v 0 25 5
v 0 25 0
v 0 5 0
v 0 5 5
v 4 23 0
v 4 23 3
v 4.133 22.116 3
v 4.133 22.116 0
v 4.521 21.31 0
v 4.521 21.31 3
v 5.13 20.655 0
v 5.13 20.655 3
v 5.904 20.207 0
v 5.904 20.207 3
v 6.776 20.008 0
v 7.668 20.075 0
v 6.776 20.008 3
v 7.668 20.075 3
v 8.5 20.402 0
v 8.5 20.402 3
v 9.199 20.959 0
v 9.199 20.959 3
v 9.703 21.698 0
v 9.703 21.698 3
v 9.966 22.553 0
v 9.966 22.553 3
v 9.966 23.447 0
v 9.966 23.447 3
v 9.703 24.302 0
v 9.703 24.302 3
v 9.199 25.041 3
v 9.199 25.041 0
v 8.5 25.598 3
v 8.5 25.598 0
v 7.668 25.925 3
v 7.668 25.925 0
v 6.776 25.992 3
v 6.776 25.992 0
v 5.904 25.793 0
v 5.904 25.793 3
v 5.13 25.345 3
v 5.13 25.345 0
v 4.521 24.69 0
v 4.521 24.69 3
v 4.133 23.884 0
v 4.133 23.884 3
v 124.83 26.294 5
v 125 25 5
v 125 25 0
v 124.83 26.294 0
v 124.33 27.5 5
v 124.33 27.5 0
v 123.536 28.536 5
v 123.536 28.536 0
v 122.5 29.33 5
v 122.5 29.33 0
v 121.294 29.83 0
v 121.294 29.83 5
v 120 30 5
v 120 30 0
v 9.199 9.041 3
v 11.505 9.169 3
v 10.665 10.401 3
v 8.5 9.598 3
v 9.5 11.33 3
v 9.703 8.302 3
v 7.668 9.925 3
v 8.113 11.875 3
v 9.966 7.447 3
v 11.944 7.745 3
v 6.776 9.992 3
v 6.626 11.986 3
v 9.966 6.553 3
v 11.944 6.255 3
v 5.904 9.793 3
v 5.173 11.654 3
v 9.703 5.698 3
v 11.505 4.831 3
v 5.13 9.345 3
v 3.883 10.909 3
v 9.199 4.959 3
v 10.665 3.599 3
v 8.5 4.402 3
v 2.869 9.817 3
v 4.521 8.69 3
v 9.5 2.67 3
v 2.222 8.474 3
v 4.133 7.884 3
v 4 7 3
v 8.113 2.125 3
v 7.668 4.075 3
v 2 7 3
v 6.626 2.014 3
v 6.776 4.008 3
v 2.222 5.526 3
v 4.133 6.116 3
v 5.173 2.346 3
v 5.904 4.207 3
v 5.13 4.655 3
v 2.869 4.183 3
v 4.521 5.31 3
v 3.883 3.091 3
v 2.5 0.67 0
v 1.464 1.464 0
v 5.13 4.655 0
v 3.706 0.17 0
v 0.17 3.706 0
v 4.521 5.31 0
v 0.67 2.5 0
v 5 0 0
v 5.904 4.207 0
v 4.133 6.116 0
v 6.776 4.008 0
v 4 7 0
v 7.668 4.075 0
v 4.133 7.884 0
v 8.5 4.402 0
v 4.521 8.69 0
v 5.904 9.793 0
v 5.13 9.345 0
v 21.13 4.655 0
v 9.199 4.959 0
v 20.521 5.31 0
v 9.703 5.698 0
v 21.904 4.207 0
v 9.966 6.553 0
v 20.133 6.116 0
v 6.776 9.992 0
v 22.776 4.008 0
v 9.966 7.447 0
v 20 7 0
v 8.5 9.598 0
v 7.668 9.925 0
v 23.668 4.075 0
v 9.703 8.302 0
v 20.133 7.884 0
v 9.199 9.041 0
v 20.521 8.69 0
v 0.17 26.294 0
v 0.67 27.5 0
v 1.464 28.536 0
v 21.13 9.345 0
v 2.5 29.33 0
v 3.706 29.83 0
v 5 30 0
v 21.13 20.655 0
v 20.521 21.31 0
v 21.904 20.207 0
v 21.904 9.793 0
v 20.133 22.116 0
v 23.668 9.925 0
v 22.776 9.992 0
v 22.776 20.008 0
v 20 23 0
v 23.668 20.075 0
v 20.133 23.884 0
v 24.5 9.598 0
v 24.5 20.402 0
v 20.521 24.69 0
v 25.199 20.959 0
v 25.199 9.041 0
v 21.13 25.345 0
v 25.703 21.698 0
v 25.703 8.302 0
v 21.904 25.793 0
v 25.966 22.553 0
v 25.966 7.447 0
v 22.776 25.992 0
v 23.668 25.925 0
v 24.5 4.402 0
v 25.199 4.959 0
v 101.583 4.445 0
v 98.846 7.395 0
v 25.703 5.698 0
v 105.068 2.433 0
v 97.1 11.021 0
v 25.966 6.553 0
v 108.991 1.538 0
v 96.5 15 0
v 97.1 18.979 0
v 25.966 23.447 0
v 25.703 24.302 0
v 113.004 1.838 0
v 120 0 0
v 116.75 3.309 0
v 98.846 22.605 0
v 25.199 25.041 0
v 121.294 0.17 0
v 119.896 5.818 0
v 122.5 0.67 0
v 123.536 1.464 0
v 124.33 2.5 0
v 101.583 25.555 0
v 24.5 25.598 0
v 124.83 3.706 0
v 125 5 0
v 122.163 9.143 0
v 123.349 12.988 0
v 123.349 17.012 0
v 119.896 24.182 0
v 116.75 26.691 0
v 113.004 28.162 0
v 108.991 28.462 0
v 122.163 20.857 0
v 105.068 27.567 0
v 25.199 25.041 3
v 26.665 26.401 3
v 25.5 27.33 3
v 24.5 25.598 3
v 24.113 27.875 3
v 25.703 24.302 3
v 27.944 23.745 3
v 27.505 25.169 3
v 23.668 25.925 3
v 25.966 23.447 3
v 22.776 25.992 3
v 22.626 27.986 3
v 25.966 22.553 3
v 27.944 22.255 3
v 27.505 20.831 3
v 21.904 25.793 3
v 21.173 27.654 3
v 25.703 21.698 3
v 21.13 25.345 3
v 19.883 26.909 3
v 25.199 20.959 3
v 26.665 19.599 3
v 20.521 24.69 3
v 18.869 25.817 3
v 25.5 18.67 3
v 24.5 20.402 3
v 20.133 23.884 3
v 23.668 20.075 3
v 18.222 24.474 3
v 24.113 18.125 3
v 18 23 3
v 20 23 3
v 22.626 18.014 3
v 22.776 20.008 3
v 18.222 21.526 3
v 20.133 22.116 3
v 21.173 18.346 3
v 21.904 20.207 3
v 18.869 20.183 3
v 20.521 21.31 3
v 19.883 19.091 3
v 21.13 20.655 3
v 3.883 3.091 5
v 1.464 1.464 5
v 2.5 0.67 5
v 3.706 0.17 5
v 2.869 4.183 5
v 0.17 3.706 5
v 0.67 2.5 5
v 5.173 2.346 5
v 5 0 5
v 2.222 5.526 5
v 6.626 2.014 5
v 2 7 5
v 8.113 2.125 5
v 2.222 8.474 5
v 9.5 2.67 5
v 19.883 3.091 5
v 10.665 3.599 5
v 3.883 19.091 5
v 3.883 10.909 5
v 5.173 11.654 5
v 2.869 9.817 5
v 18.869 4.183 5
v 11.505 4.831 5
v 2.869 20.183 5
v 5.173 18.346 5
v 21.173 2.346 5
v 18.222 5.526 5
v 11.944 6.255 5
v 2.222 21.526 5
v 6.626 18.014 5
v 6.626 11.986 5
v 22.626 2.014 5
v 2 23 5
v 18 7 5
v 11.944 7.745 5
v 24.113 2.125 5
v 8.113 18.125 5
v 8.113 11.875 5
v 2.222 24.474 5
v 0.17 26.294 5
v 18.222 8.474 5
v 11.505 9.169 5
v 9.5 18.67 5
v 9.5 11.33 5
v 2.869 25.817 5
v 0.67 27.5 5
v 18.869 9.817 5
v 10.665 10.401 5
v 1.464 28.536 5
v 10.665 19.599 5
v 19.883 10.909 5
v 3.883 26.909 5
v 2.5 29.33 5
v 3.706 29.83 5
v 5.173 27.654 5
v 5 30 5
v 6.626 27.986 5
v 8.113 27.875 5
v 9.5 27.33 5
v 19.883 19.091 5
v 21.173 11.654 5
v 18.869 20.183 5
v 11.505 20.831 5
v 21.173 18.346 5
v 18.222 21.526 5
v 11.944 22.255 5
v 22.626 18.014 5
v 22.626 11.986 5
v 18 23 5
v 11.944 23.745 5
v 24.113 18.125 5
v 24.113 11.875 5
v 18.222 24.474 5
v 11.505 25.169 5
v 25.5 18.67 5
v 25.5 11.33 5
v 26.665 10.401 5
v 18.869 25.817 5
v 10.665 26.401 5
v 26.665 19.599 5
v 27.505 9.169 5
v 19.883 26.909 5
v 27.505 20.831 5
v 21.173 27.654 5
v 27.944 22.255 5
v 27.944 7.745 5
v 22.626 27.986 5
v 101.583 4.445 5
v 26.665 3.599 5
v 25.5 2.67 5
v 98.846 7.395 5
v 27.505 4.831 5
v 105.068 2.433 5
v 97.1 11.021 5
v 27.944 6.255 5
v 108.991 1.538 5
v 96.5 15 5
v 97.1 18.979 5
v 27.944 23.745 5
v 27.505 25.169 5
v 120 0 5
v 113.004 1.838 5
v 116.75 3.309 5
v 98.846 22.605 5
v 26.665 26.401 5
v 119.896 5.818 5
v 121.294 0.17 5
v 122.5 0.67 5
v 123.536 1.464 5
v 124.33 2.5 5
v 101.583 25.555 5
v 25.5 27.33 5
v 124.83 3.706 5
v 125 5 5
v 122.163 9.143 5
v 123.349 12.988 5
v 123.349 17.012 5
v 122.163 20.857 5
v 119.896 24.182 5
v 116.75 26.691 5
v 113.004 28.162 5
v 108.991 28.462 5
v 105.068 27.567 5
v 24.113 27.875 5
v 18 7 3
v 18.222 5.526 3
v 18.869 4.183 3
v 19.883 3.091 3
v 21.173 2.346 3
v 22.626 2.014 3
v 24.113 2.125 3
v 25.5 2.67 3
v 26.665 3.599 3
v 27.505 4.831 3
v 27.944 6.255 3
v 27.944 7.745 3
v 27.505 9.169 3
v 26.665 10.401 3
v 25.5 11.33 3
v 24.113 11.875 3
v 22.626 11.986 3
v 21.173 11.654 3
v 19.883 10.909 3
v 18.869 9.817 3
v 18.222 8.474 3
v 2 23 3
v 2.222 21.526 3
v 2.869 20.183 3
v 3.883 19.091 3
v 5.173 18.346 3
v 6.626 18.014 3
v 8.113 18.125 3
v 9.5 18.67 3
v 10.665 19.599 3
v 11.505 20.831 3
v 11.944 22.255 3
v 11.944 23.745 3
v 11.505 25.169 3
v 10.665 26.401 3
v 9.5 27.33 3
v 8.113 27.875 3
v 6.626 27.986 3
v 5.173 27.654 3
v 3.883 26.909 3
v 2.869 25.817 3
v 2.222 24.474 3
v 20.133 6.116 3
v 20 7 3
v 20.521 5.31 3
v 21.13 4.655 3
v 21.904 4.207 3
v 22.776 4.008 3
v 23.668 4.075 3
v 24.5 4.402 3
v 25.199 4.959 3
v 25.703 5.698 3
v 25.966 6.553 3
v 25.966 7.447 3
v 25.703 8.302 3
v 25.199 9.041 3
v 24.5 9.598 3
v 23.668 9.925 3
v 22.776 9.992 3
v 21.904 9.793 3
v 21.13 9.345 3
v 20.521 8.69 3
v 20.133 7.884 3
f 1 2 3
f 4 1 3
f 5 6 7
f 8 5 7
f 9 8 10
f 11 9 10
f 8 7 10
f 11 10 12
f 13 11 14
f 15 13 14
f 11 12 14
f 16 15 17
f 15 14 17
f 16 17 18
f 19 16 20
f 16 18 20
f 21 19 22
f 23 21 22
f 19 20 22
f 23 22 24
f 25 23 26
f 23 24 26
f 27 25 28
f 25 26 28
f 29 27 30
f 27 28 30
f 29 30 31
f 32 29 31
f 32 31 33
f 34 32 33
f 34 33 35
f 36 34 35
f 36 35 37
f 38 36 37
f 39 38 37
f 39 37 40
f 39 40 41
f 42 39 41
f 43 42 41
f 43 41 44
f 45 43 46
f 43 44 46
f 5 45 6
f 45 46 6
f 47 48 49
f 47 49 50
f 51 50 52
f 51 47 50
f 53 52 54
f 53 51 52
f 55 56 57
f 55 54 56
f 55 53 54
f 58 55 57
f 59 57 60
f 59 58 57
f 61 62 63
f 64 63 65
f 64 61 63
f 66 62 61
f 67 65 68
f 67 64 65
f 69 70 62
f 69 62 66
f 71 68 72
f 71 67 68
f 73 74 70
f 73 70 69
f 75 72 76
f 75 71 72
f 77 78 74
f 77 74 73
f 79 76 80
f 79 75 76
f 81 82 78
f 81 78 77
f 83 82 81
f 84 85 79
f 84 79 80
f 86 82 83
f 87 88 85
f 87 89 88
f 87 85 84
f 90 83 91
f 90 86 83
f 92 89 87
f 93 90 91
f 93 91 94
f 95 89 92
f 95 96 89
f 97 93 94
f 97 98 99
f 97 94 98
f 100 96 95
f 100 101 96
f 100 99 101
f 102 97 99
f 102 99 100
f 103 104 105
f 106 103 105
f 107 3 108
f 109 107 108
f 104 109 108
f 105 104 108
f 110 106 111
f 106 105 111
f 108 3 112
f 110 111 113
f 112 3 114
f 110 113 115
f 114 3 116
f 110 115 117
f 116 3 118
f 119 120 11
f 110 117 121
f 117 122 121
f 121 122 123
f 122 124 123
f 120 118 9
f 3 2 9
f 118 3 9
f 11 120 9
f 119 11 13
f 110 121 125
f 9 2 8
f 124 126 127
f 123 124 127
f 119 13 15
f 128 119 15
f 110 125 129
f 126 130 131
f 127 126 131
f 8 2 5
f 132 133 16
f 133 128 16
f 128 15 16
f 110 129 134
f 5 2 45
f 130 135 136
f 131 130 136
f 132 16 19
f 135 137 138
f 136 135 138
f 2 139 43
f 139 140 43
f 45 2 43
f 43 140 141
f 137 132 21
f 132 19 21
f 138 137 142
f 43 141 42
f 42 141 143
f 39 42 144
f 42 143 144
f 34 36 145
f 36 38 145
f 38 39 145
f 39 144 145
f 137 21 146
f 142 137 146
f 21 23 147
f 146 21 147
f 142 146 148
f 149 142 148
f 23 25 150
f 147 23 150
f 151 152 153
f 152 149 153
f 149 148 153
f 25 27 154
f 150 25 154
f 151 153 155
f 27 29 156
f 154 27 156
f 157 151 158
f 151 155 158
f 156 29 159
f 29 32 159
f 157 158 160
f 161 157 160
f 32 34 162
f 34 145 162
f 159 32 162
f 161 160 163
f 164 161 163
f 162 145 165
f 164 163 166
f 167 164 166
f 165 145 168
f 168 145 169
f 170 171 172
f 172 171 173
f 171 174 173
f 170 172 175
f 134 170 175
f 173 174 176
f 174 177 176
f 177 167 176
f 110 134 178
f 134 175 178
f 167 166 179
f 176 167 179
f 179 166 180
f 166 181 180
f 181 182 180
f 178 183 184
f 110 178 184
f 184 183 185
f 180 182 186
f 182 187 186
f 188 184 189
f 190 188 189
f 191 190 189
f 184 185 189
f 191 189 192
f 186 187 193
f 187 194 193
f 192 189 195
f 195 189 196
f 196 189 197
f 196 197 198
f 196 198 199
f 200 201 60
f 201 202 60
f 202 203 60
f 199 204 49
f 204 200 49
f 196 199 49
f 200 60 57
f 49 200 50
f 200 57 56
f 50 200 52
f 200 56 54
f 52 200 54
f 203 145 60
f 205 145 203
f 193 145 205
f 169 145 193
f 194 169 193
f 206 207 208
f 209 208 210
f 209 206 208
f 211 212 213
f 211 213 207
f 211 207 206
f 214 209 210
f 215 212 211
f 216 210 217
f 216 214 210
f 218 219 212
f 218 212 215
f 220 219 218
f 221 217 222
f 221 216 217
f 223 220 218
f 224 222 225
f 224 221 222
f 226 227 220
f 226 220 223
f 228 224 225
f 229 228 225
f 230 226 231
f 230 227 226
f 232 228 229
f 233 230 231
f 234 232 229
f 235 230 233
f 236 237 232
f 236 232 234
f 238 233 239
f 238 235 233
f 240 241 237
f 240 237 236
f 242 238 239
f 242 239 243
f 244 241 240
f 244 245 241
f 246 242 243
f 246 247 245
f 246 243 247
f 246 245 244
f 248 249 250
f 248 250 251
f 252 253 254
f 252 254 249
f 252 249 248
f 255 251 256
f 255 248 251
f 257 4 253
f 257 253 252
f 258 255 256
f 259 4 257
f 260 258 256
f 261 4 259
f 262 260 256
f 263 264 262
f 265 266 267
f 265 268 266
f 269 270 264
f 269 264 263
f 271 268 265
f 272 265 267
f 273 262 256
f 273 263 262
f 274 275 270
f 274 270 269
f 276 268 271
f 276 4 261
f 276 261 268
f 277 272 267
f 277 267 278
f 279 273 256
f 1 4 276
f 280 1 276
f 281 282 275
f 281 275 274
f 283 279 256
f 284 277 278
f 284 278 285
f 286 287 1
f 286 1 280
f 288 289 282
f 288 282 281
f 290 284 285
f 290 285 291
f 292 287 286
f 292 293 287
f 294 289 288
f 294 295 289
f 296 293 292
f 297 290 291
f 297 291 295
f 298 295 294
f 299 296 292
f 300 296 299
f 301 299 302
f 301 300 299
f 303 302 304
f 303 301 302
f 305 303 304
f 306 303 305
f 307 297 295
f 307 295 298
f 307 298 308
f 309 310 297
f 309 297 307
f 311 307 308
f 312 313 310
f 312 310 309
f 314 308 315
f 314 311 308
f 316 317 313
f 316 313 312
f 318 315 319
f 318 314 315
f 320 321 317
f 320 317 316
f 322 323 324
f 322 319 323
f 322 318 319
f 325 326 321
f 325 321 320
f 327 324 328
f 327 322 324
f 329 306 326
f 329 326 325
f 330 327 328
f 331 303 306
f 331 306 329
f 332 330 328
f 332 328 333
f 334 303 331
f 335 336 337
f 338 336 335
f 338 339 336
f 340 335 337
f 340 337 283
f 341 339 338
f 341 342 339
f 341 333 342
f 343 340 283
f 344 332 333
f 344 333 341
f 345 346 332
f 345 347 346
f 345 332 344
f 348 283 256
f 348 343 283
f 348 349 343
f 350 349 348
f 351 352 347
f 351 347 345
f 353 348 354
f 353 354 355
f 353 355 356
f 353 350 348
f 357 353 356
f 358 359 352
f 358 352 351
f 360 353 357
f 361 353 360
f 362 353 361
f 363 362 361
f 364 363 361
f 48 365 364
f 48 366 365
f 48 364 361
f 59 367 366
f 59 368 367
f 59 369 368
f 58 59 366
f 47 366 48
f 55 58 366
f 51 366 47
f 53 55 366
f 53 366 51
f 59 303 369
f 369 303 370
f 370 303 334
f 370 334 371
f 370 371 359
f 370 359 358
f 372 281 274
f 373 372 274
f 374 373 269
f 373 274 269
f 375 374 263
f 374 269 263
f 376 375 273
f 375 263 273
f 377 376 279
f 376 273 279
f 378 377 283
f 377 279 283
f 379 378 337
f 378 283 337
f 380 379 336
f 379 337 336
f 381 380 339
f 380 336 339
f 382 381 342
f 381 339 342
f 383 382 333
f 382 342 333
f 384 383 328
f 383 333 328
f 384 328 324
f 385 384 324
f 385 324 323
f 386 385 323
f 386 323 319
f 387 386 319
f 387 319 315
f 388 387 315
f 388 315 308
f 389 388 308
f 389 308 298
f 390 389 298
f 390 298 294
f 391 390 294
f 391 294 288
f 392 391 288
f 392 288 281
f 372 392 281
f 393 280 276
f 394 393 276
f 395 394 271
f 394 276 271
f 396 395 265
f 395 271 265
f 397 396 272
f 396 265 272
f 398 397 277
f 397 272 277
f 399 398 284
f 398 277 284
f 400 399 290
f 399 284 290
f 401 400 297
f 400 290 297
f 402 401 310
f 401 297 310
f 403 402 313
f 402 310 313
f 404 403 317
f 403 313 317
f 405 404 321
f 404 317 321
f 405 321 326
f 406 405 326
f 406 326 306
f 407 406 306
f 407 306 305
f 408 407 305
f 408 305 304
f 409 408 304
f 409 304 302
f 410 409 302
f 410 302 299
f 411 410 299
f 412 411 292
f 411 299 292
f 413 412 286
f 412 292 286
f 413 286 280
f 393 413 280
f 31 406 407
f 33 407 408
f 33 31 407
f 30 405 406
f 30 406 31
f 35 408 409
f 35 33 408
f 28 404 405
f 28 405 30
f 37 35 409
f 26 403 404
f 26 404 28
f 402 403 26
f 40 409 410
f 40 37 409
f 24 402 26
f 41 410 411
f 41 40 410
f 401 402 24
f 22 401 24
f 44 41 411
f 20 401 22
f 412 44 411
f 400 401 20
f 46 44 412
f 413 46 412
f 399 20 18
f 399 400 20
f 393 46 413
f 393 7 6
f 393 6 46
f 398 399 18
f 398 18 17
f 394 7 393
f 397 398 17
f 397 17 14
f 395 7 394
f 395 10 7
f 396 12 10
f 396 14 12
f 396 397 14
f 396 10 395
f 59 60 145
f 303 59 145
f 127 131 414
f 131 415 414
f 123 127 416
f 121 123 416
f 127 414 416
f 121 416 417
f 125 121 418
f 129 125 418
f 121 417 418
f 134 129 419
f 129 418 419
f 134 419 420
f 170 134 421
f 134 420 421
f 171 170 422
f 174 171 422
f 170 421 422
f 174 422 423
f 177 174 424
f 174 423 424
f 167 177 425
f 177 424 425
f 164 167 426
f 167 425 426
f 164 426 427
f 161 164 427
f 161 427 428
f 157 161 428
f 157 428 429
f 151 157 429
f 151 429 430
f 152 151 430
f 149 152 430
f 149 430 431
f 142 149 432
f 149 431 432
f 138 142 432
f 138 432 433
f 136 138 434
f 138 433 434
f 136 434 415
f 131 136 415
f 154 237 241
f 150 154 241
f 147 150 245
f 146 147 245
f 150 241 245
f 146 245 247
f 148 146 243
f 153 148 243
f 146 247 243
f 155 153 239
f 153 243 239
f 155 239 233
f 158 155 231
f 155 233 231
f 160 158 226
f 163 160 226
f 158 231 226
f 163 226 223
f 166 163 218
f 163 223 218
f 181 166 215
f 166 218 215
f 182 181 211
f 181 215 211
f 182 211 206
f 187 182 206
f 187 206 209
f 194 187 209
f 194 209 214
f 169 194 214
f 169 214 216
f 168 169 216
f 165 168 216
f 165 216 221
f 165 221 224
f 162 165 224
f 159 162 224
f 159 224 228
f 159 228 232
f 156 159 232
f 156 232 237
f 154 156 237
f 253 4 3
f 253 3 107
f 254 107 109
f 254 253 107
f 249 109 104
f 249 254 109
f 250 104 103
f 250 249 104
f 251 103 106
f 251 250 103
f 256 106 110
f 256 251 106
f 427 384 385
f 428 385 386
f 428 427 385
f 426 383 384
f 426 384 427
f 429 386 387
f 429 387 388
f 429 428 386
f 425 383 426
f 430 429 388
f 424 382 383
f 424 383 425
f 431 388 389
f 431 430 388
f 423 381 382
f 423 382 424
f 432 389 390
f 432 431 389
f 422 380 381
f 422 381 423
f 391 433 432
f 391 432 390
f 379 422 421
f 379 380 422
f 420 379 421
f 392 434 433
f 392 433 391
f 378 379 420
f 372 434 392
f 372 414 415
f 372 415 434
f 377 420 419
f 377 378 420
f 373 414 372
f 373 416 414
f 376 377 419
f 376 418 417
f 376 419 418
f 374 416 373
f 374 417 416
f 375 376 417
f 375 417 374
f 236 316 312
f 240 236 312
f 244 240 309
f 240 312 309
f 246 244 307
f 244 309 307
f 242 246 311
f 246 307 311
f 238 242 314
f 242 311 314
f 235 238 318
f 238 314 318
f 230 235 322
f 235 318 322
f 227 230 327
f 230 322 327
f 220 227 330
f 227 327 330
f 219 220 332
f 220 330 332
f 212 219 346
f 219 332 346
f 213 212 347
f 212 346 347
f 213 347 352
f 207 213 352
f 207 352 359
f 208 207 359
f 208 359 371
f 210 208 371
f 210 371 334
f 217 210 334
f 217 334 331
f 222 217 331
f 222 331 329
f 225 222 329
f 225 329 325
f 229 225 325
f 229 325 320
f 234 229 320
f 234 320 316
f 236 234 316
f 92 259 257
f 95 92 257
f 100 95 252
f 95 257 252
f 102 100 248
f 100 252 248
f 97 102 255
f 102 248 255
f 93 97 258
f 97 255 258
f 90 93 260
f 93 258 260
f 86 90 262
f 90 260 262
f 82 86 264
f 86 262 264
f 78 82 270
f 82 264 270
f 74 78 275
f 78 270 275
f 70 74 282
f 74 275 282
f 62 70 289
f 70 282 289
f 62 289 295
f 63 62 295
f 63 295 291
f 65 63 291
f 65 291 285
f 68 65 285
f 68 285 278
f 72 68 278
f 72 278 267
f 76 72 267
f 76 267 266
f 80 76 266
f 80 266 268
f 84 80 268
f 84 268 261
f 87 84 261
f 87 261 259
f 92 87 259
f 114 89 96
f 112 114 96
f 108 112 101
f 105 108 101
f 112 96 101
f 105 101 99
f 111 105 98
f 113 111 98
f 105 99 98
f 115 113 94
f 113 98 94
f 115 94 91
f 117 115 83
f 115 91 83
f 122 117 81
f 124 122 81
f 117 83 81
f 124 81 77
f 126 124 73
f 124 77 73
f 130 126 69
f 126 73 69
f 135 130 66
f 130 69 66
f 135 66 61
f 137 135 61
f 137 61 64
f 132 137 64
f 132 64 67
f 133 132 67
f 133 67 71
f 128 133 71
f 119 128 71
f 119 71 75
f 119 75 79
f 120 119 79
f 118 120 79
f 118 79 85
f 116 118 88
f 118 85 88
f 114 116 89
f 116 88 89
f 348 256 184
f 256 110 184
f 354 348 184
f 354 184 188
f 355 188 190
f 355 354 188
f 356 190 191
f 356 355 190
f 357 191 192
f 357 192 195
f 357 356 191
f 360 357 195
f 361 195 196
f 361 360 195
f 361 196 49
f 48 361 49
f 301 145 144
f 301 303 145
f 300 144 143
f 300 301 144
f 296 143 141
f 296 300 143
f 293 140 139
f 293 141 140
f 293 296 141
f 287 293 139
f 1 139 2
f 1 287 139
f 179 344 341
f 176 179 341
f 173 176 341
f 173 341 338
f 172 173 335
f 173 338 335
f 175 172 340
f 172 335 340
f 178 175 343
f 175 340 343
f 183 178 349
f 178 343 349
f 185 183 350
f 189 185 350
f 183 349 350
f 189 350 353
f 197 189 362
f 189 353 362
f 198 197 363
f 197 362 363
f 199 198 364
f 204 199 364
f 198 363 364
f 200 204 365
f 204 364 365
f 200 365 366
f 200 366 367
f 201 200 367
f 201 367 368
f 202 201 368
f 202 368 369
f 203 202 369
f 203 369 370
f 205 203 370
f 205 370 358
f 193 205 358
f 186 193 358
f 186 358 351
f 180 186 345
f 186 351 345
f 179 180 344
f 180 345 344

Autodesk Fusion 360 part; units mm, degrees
sketch "Sketch1" plane through (0, 0, 0) normal (0, 0, 1) x (1, 0, 0)
  line L0 (0, 0) -> (125, 0)
  line L1 (125, 0) -> (125, 30)
  line L2 (125, 30) -> (0, 30)
  line L3 (0, 30) -> (0, 0)
  dimension "d1" = 125
  dimension "d2" = 30
extrude "Extrude1" add sketch "Sketch1" along normal blind 5
sketch "Sketch2" plane through (0, 0, 5) normal (0, 0, 1) x (-1, 0, 0)
  line L0 (0, -30) -> (0, 0)
  line L1 (0, 0) -> (-125, 0)
  line L2 (-125, 0) -> (-125, -30)
  line L3 (-125, -30) -> (0, -30)
  circle A0 centre (-110, -15) radius 13.5
  dimension "d5" = 27
extrude "Extrude2" cut sketch "Sketch2" against normal blind 5 contours A0
sketch "Sketch3" plane through (0, 0, 5) normal (0, 0, 1) x (-1, 0, 0)
  circle A0 centre (-110, -15) radius 13.5
  line L0 (0, -30) -> (0, 0)
  line L1 (0, 0) -> (-125, 0)
  line L2 (-125, 0) -> (-125, -30)
  line L3 (-125, -30) -> (0, -30)
  circle A1 centre (-7, -23) radius 3
  circle A2 centre (-7, -7) radius 3
  circle A3 centre (-23, -23) radius 3
  circle A4 centre (-23, -7) radius 3
  dimension "d8" = 6
  dimension "d9" = 6
  dimension "d10" = 6
  dimension "d11" = 6
extrude "Extrude3" cut sketch "Sketch3" against normal blind 5 contours A1 | A2 | A3 | A4
sketch "Sketch4" plane through (0, 0, 5) normal (0, 0, 1) x (-1, 0, 0)
  circle A0 centre (-23, -7) radius 3
  circle A1 centre (-23, -23) radius 3
  circle A2 centre (-7, -7) radius 3
  circle A3 centre (-7, -23) radius 3
  circle A4 centre (-110, -15) radius 13.5
  line L0 (0, -30) -> (0, 0)
  line L1 (0, 0) -> (-125, 0)
  line L2 (-125, 0) -> (-125, -30)
  line L3 (-125, -30) -> (0, -30)
  circle A5 centre (-7, -23) radius 5
  circle A6 centre (-23, -23) radius 5
  circle A7 centre (-7, -7) radius 5
  circle A8 centre (-23, -7) radius 5
  dimension "d14" = 10
  dimension "d15" = 10
  dimension "d16" = 10
  dimension "d17" = 10
extrude "Extrude4" cut sketch "Sketch4" against normal blind 2 contours A5 | A6 | A7 | A8
fillet "Fillet1" radius 5 4 edges at (125, 30, 2.5) (125, 0, 2.5) (0, 0, 2.5) (0, 30, 2.5)
